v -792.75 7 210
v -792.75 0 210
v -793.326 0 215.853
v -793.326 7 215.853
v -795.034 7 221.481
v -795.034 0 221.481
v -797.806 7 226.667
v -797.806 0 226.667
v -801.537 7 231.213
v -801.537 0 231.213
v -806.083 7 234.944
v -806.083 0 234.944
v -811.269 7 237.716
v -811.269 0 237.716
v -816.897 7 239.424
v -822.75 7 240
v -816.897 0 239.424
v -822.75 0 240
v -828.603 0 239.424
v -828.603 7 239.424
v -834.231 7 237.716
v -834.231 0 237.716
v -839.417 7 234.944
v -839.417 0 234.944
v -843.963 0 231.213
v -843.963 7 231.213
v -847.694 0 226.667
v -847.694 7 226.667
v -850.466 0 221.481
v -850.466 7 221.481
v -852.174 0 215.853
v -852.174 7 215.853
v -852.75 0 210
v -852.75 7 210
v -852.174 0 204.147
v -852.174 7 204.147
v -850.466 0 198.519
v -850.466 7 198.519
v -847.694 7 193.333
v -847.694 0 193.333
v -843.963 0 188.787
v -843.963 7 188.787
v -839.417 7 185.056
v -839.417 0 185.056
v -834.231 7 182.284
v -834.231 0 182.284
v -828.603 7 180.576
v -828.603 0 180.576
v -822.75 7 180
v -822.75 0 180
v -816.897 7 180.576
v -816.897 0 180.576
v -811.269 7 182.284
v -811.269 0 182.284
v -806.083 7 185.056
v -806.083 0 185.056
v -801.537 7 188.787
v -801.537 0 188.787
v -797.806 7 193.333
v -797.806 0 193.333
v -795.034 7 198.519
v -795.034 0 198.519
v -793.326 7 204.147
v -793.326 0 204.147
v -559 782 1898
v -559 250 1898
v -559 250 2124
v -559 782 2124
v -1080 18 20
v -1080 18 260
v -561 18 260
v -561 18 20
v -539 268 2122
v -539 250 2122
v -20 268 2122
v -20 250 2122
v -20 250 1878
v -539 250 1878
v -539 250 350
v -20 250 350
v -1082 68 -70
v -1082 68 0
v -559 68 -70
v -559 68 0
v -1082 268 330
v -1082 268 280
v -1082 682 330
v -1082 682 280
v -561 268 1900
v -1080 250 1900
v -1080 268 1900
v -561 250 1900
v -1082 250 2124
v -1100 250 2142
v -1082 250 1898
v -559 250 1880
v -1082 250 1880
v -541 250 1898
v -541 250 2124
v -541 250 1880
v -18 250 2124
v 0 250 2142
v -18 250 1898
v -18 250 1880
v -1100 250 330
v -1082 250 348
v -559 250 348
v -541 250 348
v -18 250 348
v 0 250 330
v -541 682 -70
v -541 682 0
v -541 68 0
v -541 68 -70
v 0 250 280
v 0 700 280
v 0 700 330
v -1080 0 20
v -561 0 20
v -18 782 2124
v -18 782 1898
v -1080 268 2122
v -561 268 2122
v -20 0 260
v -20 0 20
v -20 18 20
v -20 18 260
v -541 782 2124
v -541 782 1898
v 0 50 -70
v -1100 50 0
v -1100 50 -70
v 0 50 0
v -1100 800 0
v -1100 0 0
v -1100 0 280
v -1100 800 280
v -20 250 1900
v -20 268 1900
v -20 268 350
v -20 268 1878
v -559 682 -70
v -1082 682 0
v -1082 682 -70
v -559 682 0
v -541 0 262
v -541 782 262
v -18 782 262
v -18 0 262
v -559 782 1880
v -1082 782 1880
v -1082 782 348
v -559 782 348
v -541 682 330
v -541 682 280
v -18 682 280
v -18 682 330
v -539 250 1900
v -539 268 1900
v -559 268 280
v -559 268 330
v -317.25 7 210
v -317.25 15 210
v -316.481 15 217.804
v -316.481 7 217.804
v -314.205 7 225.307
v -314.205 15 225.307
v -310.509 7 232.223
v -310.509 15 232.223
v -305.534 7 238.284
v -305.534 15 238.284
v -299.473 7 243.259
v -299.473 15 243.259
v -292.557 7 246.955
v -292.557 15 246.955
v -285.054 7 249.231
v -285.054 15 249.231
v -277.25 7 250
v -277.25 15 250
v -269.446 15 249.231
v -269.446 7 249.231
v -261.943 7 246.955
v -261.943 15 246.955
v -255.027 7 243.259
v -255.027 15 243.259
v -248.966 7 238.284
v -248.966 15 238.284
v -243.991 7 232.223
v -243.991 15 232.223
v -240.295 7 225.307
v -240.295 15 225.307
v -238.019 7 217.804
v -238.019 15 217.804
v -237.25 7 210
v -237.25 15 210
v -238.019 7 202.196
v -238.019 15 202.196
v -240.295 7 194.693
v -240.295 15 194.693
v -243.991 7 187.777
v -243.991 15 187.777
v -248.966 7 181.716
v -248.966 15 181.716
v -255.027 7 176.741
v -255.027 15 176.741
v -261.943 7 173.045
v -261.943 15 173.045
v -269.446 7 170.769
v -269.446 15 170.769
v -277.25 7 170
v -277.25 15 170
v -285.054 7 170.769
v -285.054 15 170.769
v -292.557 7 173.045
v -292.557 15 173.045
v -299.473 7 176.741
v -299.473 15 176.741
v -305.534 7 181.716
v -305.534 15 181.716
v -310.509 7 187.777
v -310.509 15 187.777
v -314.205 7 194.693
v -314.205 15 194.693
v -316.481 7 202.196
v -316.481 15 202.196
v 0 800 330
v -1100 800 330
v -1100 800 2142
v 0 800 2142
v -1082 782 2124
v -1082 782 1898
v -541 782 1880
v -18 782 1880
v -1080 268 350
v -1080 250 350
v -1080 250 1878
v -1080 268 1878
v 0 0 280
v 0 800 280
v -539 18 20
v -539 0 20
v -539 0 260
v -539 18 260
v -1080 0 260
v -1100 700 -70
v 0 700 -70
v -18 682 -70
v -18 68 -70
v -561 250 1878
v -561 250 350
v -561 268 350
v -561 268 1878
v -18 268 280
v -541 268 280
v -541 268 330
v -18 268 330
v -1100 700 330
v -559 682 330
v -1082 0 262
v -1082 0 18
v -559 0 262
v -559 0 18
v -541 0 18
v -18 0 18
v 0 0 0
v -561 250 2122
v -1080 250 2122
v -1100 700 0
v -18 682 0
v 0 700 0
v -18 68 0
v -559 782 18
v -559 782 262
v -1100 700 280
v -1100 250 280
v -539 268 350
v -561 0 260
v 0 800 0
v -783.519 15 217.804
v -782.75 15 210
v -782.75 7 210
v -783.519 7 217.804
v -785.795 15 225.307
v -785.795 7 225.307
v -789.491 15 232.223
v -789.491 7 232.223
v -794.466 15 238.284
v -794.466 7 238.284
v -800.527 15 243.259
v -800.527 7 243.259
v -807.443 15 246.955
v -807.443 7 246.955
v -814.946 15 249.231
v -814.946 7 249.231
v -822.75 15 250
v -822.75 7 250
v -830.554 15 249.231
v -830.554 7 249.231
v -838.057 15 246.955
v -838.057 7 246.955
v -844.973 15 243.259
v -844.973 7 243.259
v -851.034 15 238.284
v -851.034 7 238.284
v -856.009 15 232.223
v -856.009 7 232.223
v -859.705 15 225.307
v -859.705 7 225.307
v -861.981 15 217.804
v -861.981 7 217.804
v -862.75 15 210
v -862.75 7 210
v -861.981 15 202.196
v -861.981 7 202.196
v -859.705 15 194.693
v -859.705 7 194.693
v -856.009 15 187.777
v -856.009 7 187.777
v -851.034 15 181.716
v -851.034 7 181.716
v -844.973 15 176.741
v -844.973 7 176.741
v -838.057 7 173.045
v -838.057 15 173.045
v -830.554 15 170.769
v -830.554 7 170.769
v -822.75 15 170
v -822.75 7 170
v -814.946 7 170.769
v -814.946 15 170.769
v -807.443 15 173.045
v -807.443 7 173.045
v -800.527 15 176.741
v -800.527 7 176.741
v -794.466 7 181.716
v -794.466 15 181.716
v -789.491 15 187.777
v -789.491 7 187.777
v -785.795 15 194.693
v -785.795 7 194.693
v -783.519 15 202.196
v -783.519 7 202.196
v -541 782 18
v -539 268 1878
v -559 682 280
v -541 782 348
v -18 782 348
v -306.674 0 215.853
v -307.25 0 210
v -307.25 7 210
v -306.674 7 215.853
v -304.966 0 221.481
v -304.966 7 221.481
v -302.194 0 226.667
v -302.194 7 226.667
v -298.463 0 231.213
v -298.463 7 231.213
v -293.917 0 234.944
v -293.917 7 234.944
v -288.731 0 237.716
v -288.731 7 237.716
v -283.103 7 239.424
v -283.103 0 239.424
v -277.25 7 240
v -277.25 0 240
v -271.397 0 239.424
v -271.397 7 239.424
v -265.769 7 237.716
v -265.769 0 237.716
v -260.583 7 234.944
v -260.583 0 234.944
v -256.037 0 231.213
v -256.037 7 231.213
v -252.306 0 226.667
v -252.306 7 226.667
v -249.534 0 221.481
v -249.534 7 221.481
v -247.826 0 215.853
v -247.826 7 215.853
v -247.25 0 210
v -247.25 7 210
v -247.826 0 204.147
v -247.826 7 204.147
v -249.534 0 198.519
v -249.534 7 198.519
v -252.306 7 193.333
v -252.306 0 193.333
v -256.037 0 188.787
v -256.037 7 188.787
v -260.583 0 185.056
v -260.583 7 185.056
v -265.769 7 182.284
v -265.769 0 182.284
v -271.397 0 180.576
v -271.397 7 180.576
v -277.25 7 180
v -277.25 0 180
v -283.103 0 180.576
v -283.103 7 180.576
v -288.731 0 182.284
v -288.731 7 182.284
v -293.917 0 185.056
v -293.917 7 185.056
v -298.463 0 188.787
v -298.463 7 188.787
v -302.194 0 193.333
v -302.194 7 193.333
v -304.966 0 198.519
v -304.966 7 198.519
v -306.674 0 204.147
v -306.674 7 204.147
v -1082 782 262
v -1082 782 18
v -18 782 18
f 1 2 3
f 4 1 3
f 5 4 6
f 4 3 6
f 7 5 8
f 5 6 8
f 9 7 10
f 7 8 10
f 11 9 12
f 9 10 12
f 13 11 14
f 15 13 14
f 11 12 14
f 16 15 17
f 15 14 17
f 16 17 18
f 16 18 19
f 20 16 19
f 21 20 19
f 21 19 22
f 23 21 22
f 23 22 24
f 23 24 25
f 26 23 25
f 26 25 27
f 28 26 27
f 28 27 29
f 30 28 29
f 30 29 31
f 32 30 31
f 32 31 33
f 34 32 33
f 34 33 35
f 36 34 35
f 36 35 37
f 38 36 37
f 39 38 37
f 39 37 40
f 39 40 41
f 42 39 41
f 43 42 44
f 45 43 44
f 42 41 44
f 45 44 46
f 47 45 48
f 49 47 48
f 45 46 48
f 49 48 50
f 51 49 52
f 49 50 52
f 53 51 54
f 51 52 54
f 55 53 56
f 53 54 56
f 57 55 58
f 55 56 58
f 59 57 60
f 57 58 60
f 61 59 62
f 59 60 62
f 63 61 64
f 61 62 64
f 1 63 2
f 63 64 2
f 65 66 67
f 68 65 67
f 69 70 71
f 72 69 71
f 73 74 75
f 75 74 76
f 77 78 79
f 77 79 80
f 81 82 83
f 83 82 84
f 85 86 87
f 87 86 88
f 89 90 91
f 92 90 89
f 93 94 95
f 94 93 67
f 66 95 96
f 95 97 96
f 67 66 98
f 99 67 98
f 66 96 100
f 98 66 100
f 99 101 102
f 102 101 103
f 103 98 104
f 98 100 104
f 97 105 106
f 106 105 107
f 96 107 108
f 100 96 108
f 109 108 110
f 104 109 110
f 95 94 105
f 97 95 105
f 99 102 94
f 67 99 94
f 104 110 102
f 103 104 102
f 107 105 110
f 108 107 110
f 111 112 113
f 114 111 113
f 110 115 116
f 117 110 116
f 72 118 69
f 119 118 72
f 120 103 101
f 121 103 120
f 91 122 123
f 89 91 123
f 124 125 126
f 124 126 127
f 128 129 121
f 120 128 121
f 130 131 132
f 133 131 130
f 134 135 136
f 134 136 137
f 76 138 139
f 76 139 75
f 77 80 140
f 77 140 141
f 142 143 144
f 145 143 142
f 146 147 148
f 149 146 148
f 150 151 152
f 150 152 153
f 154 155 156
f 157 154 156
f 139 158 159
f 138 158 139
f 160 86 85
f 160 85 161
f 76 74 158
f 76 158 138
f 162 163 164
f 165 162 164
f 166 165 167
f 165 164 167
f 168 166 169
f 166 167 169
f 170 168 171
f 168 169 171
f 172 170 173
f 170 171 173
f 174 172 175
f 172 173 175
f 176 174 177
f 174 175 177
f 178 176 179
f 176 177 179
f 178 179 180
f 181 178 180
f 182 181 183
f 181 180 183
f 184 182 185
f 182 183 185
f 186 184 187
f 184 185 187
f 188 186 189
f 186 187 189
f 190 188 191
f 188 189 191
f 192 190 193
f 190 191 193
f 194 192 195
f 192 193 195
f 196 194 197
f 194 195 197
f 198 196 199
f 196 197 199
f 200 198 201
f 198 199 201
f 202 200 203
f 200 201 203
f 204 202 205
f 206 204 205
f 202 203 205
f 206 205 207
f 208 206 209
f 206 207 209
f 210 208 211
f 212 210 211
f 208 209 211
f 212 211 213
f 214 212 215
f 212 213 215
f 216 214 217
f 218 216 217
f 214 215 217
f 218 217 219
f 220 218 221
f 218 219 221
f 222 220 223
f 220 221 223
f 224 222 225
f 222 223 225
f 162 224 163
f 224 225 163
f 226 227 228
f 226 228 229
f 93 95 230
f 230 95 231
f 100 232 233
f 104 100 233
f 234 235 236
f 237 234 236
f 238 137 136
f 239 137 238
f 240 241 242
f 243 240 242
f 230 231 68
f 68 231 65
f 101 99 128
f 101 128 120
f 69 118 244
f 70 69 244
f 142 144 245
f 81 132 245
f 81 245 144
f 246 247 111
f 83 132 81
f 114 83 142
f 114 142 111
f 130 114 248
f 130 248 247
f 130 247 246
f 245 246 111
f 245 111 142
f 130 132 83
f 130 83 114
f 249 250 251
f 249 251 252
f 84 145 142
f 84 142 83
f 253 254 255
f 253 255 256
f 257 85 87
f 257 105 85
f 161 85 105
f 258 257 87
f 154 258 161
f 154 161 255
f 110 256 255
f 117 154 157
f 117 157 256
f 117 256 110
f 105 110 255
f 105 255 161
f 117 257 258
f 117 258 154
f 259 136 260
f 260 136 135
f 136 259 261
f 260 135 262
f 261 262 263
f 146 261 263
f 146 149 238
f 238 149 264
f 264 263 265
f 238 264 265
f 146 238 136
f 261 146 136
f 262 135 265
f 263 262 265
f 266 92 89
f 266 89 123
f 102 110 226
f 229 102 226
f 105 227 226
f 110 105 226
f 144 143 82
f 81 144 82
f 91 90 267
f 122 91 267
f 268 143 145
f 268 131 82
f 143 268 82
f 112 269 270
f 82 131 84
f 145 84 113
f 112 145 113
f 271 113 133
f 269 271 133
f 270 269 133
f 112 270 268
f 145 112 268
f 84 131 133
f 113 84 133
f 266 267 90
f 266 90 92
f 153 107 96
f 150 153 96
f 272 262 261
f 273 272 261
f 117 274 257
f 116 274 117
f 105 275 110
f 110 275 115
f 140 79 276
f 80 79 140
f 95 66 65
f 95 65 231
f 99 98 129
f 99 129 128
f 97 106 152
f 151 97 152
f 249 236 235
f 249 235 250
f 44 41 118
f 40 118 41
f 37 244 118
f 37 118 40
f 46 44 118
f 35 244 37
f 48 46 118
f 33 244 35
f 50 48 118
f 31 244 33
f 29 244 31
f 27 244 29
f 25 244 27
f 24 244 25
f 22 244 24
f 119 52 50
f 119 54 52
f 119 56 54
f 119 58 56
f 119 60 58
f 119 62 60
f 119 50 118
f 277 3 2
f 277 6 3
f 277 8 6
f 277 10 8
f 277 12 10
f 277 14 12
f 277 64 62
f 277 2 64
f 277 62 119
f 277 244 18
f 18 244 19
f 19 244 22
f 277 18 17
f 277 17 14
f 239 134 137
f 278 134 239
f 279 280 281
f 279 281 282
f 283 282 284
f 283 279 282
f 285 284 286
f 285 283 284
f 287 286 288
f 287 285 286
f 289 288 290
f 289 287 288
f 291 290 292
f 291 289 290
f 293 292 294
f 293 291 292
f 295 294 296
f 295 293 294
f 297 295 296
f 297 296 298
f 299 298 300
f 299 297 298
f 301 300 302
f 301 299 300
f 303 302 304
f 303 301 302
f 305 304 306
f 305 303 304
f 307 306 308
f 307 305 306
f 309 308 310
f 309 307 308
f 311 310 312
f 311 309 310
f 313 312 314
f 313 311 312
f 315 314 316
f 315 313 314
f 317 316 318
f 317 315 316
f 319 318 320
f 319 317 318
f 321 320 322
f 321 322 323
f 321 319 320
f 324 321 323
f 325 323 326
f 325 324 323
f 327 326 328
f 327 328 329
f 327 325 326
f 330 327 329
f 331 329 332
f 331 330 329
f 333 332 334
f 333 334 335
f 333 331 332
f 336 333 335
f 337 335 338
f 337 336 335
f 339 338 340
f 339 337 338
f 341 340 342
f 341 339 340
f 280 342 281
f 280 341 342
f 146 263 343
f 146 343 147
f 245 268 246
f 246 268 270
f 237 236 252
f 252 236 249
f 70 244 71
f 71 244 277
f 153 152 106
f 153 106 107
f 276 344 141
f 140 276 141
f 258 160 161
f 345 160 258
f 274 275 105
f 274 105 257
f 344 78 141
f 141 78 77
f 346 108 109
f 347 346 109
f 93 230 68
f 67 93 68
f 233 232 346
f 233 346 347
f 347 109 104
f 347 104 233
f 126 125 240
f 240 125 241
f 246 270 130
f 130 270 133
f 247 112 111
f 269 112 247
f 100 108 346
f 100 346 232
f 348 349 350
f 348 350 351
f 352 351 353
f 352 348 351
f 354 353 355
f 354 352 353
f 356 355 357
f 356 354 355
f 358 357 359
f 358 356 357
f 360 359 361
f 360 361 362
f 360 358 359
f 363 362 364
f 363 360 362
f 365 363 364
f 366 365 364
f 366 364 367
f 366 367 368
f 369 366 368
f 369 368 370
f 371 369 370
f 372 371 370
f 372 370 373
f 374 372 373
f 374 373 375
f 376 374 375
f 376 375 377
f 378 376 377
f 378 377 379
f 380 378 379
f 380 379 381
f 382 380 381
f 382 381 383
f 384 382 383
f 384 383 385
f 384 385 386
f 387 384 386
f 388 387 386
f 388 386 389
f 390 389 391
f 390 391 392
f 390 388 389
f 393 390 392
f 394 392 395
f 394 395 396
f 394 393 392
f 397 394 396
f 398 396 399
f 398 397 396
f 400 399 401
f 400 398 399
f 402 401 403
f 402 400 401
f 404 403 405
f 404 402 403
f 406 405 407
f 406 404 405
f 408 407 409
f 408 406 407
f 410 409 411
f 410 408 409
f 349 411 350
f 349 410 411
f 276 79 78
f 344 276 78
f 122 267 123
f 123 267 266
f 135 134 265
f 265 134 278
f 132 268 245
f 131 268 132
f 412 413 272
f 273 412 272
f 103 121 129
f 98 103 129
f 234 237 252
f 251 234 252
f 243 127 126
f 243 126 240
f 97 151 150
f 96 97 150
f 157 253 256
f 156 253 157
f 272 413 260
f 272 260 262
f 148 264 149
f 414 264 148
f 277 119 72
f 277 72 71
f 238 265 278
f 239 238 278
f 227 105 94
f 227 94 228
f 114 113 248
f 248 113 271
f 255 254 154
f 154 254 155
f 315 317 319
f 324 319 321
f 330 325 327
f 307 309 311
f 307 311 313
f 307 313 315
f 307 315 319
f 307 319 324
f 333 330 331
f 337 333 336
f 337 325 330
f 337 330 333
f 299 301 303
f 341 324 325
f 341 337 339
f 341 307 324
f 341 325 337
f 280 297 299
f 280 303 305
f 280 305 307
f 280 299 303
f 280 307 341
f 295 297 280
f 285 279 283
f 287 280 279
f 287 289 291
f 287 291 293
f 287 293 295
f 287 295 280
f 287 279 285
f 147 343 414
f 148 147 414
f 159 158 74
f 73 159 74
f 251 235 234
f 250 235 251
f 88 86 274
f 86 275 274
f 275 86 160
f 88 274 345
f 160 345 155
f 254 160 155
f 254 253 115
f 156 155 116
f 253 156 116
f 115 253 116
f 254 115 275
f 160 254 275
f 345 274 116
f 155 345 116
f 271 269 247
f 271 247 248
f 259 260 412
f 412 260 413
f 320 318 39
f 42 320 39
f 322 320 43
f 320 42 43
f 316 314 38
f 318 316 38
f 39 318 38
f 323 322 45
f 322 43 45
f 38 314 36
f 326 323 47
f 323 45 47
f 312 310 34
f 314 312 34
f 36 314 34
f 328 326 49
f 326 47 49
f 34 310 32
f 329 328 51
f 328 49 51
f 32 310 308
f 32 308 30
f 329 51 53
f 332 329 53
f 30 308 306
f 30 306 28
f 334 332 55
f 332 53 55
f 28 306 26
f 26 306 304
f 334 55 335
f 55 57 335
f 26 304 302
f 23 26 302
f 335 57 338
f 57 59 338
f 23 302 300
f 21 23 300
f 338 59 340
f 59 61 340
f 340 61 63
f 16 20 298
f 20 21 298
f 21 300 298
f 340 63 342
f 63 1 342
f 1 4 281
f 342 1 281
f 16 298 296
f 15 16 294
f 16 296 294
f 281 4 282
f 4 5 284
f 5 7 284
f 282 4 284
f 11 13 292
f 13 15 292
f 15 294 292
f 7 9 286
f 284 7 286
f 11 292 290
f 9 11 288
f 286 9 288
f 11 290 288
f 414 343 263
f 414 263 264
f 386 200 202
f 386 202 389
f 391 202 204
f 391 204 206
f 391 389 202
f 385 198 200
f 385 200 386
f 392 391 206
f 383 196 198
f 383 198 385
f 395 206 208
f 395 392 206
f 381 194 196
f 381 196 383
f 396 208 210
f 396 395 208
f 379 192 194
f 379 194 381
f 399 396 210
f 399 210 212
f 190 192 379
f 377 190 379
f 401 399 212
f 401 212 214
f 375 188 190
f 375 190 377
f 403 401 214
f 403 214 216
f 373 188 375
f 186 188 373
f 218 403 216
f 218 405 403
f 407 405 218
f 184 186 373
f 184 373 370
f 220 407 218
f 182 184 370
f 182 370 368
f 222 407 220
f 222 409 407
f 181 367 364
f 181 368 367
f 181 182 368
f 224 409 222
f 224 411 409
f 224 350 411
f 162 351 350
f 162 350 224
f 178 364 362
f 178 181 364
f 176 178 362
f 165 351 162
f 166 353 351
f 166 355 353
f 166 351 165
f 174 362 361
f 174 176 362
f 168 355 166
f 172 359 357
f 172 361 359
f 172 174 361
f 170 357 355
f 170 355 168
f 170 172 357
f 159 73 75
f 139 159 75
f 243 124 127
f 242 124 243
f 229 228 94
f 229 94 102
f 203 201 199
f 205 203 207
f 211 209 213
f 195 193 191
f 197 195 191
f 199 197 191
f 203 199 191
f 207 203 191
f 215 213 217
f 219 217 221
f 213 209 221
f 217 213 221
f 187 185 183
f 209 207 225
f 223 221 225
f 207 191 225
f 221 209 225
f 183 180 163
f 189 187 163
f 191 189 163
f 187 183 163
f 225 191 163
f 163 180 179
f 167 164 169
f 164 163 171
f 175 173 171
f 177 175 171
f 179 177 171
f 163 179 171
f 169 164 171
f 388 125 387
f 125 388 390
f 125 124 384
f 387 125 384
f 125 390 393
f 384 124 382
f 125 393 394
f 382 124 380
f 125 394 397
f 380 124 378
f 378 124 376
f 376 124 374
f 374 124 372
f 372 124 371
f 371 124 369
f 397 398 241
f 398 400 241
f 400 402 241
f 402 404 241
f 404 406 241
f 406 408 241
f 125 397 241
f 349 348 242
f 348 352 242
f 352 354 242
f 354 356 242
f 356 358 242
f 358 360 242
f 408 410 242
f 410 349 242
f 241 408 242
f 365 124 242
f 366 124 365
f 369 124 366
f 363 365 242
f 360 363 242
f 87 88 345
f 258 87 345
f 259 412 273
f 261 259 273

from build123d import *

# Parameters (mm, degrees)
F0_W      = 1100
F0_H      = 800
F1_DEPTH  = 280
F2_T      = -18
F3_W      = 18
F3_H      = 244
F4_DEPTH  = 782
F5_W      = 519
F5_H      = 240
F6_DEPTH  = 18
F8_R      = 30
F9_DEPTH  = 15
F10_R     = 40
F11_DEPTH = 8
F13_W     = 1100
F13_H     = 650
F13_W_2   = 523
F13_H_2   = 614
F14_DEPTH = 70
F15_W     = 1100
F15_H     = 450
F15_W_2   = 523
F15_H_2   = 414
F16_DEPTH = 50
F17_W     = 1100
F17_H     = 550
F18_DEPTH = 1812
F19_T     = -18
F20_W     = 18
F20_H     = 1532
F20_W_2   = 523
F20_H_2   = 18
F20_H_3   = 226
F21_DEPTH = 532
F22_W     = 519
F22_H     = 1528
F23_DEPTH = 18
F22_H_2   = 222


with BuildPart() as f1:
    # F0 (on Top) → F1 (new body)
    with BuildSketch(Plane.XY):
        with Locations((-550, 400)):
            Rectangle(F0_W, F0_H)
    extrude(amount=F1_DEPTH)

    # F2
    f2_openings = [f1.faces().sort_by_distance(p)[0] for p in [
        (-550, 0, 140),
    ]]
    offset(amount=F2_T, openings=f2_openings)

    # F3 (on face) → F4 (join, through all)
    with BuildSketch(Plane.XZ):
        with Locations((-550, 140)):
            Rectangle(F3_W, F3_H)
    extrude(amount=-F4_DEPTH)


with BuildPart() as f6:
    # F5 (on face) → F6 (new body)
    with BuildSketch(Plane.XZ):
        with Locations((-820.5, 140)):
            Rectangle(F5_W, F5_H)
    extrude(amount=-F6_DEPTH)

    # F8 (on face) → F9 (cut)
    with BuildSketch(Plane.XZ):
        with Locations((-822.75, 210)):
            Circle(F8_R)
    extrude(amount=-F9_DEPTH, mode=Mode.SUBTRACT)

    # F10 (on face) → F11 (cut)
    with BuildSketch(Plane.XZ.offset(-15)):
        with Locations((-822.75, 210)):
            Circle(F10_R)
    extrude(amount=F11_DEPTH, mode=Mode.SUBTRACT)


with BuildPart() as f12_1:
    # F12: instance of F6
    add(f6.part.mirror(Plane(origin=(-550, 400, 140), x_dir=(0, 1, 0), z_dir=(1, 0, 0))))


with BuildPart() as f14:
    # F13 (on face) → F14 (new body)
    with BuildSketch(Plane(origin=(0, 0, 0), x_dir=(1, 0, 0), z_dir=(0, 0, -1))):
        with Locations((-550, -375)):
            Rectangle(F13_W, F13_H)
        with Locations((-820.5, -375)):
            Rectangle(F13_W_2, F13_H_2, mode=Mode.SUBTRACT)
        with Locations((-279.5, -375)):
            Rectangle(F13_W_2, F13_H_2, mode=Mode.SUBTRACT)
    extrude(amount=F14_DEPTH)


with BuildPart() as f16:
    # F15 (on face) → F16 (new body)
    with BuildSketch(Plane.XY.offset(280)):
        with Locations((-550, 475)):
            Rectangle(F15_W, F15_H)
        with Locations((-820.5, 475)):
            Rectangle(F15_W_2, F15_H_2, mode=Mode.SUBTRACT)
        with Locations((-279.5, 475)):
            Rectangle(F15_W_2, F15_H_2, mode=Mode.SUBTRACT)
    extrude(amount=F16_DEPTH)


with BuildPart() as f18:
    # F17 (on face) → F18 (new body)
    with BuildSketch(Plane.XY.offset(330)):
        with Locations((-550, 525)):
            Rectangle(F17_W, F17_H)
    extrude(amount=F18_DEPTH)

    # F19
    f19_openings = [f18.faces().sort_by_distance(p)[0] for p in [
        (-550, 250, 1236),
    ]]
    offset(amount=F19_T, openings=f19_openings)

    # F20 (on face) → F21 (join, through all)
    with BuildSketch(Plane.XZ.offset(-250)):
        with Locations((-550, 1114)):
            Rectangle(F20_W, F20_H)
        with Locations((-820.5, 1889)):
            Rectangle(F20_W_2, F20_H_2)
        with Locations((-550, 1889)):
            Rectangle(F20_W, F20_H_2)
        with Locations((-279.5, 1889)):
            Rectangle(F20_W_2, F20_H_2)
        with Locations((-550, 2011)):
            Rectangle(F20_W, F20_H_3)
    extrude(amount=-F21_DEPTH)


with BuildPart() as f23:
    # F22 (on face) → F23 (new body)
    with BuildSketch(Plane.XZ.offset(-250)):
        with Locations((-820.5, 1114)):
            Rectangle(F22_W, F22_H)
    extrude(amount=-F23_DEPTH)


with BuildPart() as f23b:
    # F22 (on face) → F23, piece 2 (new body)
    with BuildSketch(Plane.XZ.offset(-250)):
        with Locations((-820.5, 2011)):
            Rectangle(F22_W, F22_H_2)
    extrude(amount=-F23_DEPTH)


with BuildPart() as f23c:
    # F22 (on face) → F23, piece 3 (new body)
    with BuildSketch(Plane.XZ.offset(-250)):
        with Locations((-279.5, 2011)):
            Rectangle(F22_W, F22_H_2)
    extrude(amount=-F23_DEPTH)


with BuildPart() as f23d:
    # F22 (on face) → F23, piece 4 (new body)
    with BuildSketch(Plane.XZ.offset(-250)):
        with Locations((-279.5, 1114)):
            Rectangle(F22_W, F22_H)
    extrude(amount=-F23_DEPTH)


solid = Compound([f1.part, f6.part, f12_1.part, f14.part, f16.part, f18.part, f23.part, f23b.part, f23c.part, f23d.part])
